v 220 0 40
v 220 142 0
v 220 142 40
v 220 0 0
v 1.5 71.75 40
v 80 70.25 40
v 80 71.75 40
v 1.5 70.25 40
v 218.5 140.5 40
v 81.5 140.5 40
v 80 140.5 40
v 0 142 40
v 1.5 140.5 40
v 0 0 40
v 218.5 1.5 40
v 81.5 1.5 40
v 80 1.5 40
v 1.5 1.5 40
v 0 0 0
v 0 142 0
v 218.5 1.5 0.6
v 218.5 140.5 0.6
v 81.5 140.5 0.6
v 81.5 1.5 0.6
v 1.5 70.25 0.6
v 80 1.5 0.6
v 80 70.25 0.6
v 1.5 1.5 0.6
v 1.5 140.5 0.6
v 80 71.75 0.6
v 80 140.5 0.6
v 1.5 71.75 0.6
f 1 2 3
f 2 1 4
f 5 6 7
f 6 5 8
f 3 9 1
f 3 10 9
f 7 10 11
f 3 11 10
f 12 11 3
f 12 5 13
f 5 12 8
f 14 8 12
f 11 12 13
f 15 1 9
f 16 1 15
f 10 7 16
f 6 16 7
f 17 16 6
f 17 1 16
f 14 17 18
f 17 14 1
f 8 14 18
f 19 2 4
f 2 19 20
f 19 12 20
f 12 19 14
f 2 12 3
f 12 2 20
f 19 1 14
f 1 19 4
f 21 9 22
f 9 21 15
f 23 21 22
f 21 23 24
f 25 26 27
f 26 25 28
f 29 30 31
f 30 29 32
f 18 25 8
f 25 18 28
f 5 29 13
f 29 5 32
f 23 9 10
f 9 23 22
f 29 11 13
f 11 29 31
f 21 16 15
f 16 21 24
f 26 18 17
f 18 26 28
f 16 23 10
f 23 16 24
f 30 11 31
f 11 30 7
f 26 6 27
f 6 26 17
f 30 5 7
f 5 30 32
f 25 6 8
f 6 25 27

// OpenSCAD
//cube([200,80,40]);
//cube([160,60,40]);
l=220;
w=142;
h=40;
wall=1.5;
difference() {
    cube([l,w,h]);
    translate([wall,wall,.6]) cube([l-wall*2,w-wall*2,h]);
}
translate([80,0,0]) cube([wall,142,h]);
translate([0,142/2-wall/2,0]) cube([80,wall,h]);
